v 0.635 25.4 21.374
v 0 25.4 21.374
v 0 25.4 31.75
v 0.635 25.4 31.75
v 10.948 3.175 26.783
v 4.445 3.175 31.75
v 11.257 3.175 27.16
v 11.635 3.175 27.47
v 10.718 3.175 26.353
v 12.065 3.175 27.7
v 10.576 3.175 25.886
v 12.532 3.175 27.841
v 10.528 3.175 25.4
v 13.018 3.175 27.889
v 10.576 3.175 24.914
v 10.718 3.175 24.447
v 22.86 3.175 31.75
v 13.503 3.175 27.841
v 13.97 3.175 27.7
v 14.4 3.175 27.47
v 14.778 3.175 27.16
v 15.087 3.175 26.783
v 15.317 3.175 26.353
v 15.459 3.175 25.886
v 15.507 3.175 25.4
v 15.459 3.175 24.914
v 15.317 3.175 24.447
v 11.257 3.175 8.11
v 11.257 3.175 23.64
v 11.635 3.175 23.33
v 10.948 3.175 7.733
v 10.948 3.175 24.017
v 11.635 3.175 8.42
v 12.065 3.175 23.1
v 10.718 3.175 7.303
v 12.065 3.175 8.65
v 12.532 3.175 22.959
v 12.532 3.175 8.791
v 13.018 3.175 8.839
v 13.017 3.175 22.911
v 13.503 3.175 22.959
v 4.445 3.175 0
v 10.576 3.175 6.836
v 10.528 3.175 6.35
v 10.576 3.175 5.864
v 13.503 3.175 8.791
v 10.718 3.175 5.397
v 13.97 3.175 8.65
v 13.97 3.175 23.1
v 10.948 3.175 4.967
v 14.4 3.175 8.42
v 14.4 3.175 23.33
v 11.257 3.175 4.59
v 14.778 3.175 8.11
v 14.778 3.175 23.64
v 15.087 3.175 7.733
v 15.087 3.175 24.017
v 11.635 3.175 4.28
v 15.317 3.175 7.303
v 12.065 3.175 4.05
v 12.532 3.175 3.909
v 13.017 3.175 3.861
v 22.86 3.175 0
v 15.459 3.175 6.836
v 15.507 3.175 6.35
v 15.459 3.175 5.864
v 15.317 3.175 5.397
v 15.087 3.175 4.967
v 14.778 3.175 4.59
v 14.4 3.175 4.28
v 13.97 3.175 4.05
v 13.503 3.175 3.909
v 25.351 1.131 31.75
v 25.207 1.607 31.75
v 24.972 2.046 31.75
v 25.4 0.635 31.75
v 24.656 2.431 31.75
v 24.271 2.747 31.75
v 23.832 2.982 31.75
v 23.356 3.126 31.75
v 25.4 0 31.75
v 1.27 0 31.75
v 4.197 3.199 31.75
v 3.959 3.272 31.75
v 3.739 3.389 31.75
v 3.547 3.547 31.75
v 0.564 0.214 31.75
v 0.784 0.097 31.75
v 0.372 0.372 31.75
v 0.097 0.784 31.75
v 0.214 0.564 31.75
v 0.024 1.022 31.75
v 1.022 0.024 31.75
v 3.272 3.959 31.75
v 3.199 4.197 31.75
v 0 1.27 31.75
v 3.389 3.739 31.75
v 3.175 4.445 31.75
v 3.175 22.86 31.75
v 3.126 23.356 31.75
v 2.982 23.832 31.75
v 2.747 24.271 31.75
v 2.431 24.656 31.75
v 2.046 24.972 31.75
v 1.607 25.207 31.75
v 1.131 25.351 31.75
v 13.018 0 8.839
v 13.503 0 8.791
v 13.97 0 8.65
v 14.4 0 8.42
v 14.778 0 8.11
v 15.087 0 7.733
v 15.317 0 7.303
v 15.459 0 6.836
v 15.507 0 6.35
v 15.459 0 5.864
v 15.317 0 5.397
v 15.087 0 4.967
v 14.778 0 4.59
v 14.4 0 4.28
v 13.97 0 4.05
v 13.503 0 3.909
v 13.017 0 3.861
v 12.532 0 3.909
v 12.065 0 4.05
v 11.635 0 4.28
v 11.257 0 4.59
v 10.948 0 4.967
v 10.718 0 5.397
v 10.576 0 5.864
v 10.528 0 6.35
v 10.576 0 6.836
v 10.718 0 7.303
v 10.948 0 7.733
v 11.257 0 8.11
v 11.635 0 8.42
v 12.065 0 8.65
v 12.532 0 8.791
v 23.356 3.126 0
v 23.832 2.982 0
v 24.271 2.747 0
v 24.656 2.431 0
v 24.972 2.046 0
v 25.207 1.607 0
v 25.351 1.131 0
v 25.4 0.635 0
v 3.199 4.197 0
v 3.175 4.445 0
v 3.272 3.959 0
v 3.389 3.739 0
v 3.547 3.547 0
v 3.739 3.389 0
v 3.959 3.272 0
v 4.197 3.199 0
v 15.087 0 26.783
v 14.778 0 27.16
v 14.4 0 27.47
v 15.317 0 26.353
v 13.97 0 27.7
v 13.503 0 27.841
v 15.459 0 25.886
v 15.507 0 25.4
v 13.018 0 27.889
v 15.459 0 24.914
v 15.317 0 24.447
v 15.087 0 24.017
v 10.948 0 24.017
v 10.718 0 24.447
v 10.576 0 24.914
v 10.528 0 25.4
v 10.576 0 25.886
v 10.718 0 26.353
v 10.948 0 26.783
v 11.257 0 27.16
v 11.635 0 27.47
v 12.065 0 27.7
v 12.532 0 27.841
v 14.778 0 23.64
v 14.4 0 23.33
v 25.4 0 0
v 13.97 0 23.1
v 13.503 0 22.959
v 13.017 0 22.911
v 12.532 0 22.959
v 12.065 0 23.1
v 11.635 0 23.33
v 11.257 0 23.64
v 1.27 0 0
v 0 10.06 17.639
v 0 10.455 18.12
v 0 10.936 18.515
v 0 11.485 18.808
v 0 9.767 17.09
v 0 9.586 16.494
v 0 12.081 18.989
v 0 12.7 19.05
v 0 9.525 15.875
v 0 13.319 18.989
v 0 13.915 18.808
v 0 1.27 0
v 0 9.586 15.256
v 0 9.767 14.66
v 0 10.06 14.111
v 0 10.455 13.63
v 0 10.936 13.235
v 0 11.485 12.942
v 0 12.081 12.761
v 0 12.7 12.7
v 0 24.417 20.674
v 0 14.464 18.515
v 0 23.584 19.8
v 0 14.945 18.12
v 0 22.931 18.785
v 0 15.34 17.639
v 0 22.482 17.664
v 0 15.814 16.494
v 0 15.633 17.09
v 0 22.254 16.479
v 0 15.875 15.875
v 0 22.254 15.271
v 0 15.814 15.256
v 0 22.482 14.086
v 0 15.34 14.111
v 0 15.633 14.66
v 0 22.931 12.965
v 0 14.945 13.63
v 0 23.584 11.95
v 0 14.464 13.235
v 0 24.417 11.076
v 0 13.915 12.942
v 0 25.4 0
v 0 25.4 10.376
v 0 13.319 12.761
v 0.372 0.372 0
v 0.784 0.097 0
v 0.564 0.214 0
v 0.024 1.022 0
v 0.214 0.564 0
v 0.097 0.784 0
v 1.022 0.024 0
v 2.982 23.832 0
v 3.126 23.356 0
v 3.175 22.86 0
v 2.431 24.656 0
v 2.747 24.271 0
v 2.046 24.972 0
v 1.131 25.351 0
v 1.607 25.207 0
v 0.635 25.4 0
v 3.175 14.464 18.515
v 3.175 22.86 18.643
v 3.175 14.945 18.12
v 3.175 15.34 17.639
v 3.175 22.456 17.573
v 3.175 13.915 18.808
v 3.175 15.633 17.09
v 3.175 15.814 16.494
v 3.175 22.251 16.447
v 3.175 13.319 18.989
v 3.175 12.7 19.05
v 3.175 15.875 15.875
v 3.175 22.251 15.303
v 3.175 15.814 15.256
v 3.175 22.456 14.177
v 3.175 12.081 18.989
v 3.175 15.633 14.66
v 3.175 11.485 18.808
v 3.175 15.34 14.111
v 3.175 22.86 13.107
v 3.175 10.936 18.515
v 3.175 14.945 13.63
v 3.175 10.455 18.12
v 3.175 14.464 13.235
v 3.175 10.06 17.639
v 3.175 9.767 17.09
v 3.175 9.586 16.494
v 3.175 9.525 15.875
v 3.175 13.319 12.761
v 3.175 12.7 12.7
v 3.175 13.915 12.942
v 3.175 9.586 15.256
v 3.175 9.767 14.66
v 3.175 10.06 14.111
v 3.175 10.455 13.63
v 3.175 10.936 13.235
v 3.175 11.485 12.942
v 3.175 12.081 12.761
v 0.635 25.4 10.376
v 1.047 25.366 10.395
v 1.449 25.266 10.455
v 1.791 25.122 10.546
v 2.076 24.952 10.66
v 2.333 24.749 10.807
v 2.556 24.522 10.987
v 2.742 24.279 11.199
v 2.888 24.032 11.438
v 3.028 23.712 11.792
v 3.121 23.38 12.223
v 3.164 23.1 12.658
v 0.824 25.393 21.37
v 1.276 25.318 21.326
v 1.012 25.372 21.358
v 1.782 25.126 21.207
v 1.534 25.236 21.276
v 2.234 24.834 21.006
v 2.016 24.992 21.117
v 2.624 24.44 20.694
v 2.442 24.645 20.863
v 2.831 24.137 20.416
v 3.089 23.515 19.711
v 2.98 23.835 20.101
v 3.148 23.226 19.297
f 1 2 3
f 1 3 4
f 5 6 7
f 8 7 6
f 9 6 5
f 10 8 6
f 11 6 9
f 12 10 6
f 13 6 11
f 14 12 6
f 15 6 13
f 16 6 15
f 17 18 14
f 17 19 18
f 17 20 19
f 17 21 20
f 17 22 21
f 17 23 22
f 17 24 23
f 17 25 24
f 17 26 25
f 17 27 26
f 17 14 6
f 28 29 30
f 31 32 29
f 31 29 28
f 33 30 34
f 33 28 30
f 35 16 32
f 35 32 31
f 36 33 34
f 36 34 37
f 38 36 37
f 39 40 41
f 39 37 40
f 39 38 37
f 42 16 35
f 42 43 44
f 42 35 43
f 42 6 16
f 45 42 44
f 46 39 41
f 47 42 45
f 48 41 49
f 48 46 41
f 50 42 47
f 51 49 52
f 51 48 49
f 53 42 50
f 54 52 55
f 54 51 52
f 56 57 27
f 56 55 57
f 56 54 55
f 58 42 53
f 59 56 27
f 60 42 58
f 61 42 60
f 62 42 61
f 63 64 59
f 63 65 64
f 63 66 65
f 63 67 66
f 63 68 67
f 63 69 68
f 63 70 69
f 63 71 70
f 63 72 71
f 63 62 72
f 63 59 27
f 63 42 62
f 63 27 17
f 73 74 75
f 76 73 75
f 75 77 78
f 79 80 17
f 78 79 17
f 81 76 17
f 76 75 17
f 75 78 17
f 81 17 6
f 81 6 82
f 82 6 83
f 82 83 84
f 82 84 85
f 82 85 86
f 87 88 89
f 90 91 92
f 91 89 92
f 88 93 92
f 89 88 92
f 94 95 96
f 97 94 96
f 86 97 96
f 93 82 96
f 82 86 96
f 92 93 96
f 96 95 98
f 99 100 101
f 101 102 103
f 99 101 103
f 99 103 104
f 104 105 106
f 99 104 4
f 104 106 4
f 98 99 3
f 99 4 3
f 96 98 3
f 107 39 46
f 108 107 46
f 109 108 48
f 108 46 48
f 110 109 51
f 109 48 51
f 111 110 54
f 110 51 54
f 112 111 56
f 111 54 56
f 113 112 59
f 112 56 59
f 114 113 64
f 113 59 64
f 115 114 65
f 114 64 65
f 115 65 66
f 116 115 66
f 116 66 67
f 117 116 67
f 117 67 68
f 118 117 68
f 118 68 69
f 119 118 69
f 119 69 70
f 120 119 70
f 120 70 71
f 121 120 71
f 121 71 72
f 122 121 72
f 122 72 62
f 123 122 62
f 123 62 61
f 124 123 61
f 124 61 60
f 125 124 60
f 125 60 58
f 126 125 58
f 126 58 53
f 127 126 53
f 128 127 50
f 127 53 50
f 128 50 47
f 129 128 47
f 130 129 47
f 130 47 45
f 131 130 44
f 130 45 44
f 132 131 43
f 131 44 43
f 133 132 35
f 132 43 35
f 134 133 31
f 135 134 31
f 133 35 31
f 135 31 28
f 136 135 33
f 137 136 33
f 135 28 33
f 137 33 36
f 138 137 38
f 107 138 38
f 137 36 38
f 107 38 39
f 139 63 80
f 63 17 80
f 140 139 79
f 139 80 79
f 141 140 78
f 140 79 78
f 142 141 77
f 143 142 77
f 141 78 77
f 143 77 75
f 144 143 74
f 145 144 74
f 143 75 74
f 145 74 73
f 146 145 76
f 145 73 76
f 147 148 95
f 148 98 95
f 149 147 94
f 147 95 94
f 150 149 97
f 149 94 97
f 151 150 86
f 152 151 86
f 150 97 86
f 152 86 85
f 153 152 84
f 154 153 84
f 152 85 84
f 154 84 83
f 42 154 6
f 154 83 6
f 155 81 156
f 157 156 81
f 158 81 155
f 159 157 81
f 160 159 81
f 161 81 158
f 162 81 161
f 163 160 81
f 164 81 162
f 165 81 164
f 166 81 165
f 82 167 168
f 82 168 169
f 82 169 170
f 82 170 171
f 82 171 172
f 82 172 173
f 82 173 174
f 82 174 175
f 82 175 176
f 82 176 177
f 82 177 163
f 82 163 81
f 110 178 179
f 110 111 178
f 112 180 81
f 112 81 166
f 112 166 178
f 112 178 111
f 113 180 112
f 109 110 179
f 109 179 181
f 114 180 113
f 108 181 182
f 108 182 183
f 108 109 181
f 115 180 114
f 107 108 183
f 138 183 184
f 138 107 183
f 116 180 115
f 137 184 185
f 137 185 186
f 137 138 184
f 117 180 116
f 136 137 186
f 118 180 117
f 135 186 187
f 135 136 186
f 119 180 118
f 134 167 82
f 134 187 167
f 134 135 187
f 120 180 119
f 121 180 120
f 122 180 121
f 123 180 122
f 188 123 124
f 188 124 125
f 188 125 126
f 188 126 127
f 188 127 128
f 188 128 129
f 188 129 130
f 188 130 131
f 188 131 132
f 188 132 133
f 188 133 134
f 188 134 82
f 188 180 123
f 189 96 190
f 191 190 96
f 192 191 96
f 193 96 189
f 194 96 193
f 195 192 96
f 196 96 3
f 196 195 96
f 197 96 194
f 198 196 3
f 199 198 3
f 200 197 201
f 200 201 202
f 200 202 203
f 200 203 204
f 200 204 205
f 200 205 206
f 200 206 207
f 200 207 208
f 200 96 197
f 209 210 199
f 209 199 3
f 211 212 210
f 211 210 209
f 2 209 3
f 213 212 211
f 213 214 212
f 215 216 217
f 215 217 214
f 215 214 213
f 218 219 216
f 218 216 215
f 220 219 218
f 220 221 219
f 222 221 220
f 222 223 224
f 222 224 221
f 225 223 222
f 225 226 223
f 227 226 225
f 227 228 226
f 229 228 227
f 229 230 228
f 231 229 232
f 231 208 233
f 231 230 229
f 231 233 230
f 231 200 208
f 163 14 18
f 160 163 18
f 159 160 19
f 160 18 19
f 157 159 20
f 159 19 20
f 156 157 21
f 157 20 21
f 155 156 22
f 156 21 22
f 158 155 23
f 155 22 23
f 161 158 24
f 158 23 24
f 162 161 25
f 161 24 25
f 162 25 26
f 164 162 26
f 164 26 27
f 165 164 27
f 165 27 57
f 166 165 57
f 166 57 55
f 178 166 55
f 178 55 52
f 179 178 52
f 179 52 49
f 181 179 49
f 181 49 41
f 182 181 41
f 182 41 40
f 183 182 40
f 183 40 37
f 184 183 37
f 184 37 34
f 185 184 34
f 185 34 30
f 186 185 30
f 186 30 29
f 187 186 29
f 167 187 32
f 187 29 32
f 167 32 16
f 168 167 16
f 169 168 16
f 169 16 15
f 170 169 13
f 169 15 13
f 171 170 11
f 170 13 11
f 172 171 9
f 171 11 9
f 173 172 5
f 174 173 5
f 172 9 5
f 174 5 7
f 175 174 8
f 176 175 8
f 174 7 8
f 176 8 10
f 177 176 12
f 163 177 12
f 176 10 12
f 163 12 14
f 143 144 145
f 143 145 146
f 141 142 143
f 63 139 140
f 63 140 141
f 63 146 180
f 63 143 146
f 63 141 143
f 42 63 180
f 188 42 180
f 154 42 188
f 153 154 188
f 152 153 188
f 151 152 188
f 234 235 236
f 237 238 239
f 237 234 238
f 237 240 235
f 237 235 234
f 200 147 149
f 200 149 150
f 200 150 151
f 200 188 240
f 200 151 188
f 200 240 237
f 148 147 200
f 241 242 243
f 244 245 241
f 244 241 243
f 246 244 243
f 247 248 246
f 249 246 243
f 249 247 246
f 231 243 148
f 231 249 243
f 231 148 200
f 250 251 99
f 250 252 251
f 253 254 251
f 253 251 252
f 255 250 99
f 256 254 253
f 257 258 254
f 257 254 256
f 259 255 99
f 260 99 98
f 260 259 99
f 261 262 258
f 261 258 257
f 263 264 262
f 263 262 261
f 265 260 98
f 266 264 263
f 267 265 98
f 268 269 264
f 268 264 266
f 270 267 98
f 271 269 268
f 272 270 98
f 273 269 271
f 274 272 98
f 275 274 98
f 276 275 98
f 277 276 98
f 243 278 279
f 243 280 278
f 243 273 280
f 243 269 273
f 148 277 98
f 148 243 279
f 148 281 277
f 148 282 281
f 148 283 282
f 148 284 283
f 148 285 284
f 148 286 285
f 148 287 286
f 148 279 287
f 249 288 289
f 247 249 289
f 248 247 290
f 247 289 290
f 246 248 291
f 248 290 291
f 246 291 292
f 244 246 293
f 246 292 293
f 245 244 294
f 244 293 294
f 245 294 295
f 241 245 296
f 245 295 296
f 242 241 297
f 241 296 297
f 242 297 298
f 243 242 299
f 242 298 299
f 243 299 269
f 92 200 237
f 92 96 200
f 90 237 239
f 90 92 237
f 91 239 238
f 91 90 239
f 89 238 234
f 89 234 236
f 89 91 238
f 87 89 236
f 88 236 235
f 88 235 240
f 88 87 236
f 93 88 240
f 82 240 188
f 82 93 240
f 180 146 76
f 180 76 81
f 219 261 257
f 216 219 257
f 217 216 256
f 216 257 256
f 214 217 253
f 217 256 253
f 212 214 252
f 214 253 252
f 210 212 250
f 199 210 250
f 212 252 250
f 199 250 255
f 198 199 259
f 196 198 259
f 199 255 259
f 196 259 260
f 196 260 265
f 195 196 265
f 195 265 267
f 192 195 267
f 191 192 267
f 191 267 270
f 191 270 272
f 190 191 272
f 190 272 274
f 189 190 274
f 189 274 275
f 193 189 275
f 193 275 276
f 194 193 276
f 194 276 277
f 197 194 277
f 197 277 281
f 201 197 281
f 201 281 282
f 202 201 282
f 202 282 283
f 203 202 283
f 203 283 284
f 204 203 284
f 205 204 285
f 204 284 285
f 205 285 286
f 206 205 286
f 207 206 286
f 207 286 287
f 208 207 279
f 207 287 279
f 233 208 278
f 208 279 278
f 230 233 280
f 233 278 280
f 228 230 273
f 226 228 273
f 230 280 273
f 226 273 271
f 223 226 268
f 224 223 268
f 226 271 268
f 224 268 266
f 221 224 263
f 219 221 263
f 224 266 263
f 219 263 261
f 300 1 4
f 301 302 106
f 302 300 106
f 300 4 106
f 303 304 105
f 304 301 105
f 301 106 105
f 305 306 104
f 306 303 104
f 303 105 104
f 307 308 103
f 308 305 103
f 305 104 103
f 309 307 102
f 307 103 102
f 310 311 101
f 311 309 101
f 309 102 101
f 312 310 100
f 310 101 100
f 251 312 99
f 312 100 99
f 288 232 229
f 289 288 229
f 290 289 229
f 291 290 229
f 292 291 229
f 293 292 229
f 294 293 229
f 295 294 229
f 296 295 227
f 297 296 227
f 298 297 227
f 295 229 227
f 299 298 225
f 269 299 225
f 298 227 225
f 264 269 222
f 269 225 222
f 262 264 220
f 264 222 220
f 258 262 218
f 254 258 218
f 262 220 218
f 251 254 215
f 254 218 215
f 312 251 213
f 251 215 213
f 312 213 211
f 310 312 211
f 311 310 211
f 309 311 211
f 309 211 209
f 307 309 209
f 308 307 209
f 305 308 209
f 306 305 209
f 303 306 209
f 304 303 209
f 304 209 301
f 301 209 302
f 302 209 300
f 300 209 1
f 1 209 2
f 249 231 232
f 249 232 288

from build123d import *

# Parameters (mm, degrees)
BOSS_EXTRUDE1_DEPTH = 31.75
FILLET1_R           = 2.54
FILLET2_R           = 1.27
SKETCH2_R           = 6.35
CUT_EXTRUDE1_DEPTH  = 48.941448664
SKETCH3_R           = 2.4892
CUT_EXTRUDE2_DEPTH  = 47.33759959
SKETCH4_R           = 3.175
CUT_EXTRUDE3_DEPTH  = 47.337599597


with BuildPart() as part:
    # Sketch1 → Boss-Extrude1 (new body)
    with BuildSketch(Plane.XY):
        Polygon((0, 0), (0, 25.4), (3.175, 25.4), (3.175, 3.175), (25.4, 3.175), (25.4, 0), align=None)
    extrude(amount=BOSS_EXTRUDE1_DEPTH)

    # Fillet1
    fillet1_edges = [part.edges().sort_by_distance(p)[0] for p in [
        (3.175, 25.4, 15.875),
        (25.4, 3.175, 15.875),
    ]]
    fillet(fillet1_edges, radius=FILLET1_R)

    # Fillet2
    fillet2_edges = [part.edges().sort_by_distance(p)[0] for p in [
        (0, 0, 15.875),
        (3.175, 3.175, 15.875),
    ]]
    fillet(fillet2_edges, radius=FILLET2_R)

    # Sketch2 → Cut-Extrude1 (cut, through all)
    with BuildSketch(Plane.ZY):
        with Locations((15.875, 28.575)):
            Circle(SKETCH2_R)
    extrude(amount=-CUT_EXTRUDE1_DEPTH, mode=Mode.SUBTRACT)

    # Sketch3 → Cut-Extrude2 (cut, through all)
    with BuildSketch(Plane(origin=(0, 3.175, 0), x_dir=(1, 0, 0), z_dir=(0, 1, 0))):
        with Locations(Location((13.0175, -6.35, 0), (0, 0, 270))):
            Circle(SKETCH3_R)
        with Locations(Location((13.0175, -25.4, 0), (0, 0, 270))):
            Circle(SKETCH3_R)
    extrude(amount=-CUT_EXTRUDE2_DEPTH, mode=Mode.SUBTRACT)

    # Sketch4 → Cut-Extrude3 (cut, through all)
    with BuildSketch(Plane(origin=(3.175, 0, 0), x_dir=(0, 0, -1), z_dir=(1, 0, 0))):
        with Locations(Location((-15.875, 12.7, 0), (0, 0, 90))):
            Circle(SKETCH4_R)
    extrude(amount=-CUT_EXTRUDE3_DEPTH, mode=Mode.SUBTRACT)


solid = part.part
